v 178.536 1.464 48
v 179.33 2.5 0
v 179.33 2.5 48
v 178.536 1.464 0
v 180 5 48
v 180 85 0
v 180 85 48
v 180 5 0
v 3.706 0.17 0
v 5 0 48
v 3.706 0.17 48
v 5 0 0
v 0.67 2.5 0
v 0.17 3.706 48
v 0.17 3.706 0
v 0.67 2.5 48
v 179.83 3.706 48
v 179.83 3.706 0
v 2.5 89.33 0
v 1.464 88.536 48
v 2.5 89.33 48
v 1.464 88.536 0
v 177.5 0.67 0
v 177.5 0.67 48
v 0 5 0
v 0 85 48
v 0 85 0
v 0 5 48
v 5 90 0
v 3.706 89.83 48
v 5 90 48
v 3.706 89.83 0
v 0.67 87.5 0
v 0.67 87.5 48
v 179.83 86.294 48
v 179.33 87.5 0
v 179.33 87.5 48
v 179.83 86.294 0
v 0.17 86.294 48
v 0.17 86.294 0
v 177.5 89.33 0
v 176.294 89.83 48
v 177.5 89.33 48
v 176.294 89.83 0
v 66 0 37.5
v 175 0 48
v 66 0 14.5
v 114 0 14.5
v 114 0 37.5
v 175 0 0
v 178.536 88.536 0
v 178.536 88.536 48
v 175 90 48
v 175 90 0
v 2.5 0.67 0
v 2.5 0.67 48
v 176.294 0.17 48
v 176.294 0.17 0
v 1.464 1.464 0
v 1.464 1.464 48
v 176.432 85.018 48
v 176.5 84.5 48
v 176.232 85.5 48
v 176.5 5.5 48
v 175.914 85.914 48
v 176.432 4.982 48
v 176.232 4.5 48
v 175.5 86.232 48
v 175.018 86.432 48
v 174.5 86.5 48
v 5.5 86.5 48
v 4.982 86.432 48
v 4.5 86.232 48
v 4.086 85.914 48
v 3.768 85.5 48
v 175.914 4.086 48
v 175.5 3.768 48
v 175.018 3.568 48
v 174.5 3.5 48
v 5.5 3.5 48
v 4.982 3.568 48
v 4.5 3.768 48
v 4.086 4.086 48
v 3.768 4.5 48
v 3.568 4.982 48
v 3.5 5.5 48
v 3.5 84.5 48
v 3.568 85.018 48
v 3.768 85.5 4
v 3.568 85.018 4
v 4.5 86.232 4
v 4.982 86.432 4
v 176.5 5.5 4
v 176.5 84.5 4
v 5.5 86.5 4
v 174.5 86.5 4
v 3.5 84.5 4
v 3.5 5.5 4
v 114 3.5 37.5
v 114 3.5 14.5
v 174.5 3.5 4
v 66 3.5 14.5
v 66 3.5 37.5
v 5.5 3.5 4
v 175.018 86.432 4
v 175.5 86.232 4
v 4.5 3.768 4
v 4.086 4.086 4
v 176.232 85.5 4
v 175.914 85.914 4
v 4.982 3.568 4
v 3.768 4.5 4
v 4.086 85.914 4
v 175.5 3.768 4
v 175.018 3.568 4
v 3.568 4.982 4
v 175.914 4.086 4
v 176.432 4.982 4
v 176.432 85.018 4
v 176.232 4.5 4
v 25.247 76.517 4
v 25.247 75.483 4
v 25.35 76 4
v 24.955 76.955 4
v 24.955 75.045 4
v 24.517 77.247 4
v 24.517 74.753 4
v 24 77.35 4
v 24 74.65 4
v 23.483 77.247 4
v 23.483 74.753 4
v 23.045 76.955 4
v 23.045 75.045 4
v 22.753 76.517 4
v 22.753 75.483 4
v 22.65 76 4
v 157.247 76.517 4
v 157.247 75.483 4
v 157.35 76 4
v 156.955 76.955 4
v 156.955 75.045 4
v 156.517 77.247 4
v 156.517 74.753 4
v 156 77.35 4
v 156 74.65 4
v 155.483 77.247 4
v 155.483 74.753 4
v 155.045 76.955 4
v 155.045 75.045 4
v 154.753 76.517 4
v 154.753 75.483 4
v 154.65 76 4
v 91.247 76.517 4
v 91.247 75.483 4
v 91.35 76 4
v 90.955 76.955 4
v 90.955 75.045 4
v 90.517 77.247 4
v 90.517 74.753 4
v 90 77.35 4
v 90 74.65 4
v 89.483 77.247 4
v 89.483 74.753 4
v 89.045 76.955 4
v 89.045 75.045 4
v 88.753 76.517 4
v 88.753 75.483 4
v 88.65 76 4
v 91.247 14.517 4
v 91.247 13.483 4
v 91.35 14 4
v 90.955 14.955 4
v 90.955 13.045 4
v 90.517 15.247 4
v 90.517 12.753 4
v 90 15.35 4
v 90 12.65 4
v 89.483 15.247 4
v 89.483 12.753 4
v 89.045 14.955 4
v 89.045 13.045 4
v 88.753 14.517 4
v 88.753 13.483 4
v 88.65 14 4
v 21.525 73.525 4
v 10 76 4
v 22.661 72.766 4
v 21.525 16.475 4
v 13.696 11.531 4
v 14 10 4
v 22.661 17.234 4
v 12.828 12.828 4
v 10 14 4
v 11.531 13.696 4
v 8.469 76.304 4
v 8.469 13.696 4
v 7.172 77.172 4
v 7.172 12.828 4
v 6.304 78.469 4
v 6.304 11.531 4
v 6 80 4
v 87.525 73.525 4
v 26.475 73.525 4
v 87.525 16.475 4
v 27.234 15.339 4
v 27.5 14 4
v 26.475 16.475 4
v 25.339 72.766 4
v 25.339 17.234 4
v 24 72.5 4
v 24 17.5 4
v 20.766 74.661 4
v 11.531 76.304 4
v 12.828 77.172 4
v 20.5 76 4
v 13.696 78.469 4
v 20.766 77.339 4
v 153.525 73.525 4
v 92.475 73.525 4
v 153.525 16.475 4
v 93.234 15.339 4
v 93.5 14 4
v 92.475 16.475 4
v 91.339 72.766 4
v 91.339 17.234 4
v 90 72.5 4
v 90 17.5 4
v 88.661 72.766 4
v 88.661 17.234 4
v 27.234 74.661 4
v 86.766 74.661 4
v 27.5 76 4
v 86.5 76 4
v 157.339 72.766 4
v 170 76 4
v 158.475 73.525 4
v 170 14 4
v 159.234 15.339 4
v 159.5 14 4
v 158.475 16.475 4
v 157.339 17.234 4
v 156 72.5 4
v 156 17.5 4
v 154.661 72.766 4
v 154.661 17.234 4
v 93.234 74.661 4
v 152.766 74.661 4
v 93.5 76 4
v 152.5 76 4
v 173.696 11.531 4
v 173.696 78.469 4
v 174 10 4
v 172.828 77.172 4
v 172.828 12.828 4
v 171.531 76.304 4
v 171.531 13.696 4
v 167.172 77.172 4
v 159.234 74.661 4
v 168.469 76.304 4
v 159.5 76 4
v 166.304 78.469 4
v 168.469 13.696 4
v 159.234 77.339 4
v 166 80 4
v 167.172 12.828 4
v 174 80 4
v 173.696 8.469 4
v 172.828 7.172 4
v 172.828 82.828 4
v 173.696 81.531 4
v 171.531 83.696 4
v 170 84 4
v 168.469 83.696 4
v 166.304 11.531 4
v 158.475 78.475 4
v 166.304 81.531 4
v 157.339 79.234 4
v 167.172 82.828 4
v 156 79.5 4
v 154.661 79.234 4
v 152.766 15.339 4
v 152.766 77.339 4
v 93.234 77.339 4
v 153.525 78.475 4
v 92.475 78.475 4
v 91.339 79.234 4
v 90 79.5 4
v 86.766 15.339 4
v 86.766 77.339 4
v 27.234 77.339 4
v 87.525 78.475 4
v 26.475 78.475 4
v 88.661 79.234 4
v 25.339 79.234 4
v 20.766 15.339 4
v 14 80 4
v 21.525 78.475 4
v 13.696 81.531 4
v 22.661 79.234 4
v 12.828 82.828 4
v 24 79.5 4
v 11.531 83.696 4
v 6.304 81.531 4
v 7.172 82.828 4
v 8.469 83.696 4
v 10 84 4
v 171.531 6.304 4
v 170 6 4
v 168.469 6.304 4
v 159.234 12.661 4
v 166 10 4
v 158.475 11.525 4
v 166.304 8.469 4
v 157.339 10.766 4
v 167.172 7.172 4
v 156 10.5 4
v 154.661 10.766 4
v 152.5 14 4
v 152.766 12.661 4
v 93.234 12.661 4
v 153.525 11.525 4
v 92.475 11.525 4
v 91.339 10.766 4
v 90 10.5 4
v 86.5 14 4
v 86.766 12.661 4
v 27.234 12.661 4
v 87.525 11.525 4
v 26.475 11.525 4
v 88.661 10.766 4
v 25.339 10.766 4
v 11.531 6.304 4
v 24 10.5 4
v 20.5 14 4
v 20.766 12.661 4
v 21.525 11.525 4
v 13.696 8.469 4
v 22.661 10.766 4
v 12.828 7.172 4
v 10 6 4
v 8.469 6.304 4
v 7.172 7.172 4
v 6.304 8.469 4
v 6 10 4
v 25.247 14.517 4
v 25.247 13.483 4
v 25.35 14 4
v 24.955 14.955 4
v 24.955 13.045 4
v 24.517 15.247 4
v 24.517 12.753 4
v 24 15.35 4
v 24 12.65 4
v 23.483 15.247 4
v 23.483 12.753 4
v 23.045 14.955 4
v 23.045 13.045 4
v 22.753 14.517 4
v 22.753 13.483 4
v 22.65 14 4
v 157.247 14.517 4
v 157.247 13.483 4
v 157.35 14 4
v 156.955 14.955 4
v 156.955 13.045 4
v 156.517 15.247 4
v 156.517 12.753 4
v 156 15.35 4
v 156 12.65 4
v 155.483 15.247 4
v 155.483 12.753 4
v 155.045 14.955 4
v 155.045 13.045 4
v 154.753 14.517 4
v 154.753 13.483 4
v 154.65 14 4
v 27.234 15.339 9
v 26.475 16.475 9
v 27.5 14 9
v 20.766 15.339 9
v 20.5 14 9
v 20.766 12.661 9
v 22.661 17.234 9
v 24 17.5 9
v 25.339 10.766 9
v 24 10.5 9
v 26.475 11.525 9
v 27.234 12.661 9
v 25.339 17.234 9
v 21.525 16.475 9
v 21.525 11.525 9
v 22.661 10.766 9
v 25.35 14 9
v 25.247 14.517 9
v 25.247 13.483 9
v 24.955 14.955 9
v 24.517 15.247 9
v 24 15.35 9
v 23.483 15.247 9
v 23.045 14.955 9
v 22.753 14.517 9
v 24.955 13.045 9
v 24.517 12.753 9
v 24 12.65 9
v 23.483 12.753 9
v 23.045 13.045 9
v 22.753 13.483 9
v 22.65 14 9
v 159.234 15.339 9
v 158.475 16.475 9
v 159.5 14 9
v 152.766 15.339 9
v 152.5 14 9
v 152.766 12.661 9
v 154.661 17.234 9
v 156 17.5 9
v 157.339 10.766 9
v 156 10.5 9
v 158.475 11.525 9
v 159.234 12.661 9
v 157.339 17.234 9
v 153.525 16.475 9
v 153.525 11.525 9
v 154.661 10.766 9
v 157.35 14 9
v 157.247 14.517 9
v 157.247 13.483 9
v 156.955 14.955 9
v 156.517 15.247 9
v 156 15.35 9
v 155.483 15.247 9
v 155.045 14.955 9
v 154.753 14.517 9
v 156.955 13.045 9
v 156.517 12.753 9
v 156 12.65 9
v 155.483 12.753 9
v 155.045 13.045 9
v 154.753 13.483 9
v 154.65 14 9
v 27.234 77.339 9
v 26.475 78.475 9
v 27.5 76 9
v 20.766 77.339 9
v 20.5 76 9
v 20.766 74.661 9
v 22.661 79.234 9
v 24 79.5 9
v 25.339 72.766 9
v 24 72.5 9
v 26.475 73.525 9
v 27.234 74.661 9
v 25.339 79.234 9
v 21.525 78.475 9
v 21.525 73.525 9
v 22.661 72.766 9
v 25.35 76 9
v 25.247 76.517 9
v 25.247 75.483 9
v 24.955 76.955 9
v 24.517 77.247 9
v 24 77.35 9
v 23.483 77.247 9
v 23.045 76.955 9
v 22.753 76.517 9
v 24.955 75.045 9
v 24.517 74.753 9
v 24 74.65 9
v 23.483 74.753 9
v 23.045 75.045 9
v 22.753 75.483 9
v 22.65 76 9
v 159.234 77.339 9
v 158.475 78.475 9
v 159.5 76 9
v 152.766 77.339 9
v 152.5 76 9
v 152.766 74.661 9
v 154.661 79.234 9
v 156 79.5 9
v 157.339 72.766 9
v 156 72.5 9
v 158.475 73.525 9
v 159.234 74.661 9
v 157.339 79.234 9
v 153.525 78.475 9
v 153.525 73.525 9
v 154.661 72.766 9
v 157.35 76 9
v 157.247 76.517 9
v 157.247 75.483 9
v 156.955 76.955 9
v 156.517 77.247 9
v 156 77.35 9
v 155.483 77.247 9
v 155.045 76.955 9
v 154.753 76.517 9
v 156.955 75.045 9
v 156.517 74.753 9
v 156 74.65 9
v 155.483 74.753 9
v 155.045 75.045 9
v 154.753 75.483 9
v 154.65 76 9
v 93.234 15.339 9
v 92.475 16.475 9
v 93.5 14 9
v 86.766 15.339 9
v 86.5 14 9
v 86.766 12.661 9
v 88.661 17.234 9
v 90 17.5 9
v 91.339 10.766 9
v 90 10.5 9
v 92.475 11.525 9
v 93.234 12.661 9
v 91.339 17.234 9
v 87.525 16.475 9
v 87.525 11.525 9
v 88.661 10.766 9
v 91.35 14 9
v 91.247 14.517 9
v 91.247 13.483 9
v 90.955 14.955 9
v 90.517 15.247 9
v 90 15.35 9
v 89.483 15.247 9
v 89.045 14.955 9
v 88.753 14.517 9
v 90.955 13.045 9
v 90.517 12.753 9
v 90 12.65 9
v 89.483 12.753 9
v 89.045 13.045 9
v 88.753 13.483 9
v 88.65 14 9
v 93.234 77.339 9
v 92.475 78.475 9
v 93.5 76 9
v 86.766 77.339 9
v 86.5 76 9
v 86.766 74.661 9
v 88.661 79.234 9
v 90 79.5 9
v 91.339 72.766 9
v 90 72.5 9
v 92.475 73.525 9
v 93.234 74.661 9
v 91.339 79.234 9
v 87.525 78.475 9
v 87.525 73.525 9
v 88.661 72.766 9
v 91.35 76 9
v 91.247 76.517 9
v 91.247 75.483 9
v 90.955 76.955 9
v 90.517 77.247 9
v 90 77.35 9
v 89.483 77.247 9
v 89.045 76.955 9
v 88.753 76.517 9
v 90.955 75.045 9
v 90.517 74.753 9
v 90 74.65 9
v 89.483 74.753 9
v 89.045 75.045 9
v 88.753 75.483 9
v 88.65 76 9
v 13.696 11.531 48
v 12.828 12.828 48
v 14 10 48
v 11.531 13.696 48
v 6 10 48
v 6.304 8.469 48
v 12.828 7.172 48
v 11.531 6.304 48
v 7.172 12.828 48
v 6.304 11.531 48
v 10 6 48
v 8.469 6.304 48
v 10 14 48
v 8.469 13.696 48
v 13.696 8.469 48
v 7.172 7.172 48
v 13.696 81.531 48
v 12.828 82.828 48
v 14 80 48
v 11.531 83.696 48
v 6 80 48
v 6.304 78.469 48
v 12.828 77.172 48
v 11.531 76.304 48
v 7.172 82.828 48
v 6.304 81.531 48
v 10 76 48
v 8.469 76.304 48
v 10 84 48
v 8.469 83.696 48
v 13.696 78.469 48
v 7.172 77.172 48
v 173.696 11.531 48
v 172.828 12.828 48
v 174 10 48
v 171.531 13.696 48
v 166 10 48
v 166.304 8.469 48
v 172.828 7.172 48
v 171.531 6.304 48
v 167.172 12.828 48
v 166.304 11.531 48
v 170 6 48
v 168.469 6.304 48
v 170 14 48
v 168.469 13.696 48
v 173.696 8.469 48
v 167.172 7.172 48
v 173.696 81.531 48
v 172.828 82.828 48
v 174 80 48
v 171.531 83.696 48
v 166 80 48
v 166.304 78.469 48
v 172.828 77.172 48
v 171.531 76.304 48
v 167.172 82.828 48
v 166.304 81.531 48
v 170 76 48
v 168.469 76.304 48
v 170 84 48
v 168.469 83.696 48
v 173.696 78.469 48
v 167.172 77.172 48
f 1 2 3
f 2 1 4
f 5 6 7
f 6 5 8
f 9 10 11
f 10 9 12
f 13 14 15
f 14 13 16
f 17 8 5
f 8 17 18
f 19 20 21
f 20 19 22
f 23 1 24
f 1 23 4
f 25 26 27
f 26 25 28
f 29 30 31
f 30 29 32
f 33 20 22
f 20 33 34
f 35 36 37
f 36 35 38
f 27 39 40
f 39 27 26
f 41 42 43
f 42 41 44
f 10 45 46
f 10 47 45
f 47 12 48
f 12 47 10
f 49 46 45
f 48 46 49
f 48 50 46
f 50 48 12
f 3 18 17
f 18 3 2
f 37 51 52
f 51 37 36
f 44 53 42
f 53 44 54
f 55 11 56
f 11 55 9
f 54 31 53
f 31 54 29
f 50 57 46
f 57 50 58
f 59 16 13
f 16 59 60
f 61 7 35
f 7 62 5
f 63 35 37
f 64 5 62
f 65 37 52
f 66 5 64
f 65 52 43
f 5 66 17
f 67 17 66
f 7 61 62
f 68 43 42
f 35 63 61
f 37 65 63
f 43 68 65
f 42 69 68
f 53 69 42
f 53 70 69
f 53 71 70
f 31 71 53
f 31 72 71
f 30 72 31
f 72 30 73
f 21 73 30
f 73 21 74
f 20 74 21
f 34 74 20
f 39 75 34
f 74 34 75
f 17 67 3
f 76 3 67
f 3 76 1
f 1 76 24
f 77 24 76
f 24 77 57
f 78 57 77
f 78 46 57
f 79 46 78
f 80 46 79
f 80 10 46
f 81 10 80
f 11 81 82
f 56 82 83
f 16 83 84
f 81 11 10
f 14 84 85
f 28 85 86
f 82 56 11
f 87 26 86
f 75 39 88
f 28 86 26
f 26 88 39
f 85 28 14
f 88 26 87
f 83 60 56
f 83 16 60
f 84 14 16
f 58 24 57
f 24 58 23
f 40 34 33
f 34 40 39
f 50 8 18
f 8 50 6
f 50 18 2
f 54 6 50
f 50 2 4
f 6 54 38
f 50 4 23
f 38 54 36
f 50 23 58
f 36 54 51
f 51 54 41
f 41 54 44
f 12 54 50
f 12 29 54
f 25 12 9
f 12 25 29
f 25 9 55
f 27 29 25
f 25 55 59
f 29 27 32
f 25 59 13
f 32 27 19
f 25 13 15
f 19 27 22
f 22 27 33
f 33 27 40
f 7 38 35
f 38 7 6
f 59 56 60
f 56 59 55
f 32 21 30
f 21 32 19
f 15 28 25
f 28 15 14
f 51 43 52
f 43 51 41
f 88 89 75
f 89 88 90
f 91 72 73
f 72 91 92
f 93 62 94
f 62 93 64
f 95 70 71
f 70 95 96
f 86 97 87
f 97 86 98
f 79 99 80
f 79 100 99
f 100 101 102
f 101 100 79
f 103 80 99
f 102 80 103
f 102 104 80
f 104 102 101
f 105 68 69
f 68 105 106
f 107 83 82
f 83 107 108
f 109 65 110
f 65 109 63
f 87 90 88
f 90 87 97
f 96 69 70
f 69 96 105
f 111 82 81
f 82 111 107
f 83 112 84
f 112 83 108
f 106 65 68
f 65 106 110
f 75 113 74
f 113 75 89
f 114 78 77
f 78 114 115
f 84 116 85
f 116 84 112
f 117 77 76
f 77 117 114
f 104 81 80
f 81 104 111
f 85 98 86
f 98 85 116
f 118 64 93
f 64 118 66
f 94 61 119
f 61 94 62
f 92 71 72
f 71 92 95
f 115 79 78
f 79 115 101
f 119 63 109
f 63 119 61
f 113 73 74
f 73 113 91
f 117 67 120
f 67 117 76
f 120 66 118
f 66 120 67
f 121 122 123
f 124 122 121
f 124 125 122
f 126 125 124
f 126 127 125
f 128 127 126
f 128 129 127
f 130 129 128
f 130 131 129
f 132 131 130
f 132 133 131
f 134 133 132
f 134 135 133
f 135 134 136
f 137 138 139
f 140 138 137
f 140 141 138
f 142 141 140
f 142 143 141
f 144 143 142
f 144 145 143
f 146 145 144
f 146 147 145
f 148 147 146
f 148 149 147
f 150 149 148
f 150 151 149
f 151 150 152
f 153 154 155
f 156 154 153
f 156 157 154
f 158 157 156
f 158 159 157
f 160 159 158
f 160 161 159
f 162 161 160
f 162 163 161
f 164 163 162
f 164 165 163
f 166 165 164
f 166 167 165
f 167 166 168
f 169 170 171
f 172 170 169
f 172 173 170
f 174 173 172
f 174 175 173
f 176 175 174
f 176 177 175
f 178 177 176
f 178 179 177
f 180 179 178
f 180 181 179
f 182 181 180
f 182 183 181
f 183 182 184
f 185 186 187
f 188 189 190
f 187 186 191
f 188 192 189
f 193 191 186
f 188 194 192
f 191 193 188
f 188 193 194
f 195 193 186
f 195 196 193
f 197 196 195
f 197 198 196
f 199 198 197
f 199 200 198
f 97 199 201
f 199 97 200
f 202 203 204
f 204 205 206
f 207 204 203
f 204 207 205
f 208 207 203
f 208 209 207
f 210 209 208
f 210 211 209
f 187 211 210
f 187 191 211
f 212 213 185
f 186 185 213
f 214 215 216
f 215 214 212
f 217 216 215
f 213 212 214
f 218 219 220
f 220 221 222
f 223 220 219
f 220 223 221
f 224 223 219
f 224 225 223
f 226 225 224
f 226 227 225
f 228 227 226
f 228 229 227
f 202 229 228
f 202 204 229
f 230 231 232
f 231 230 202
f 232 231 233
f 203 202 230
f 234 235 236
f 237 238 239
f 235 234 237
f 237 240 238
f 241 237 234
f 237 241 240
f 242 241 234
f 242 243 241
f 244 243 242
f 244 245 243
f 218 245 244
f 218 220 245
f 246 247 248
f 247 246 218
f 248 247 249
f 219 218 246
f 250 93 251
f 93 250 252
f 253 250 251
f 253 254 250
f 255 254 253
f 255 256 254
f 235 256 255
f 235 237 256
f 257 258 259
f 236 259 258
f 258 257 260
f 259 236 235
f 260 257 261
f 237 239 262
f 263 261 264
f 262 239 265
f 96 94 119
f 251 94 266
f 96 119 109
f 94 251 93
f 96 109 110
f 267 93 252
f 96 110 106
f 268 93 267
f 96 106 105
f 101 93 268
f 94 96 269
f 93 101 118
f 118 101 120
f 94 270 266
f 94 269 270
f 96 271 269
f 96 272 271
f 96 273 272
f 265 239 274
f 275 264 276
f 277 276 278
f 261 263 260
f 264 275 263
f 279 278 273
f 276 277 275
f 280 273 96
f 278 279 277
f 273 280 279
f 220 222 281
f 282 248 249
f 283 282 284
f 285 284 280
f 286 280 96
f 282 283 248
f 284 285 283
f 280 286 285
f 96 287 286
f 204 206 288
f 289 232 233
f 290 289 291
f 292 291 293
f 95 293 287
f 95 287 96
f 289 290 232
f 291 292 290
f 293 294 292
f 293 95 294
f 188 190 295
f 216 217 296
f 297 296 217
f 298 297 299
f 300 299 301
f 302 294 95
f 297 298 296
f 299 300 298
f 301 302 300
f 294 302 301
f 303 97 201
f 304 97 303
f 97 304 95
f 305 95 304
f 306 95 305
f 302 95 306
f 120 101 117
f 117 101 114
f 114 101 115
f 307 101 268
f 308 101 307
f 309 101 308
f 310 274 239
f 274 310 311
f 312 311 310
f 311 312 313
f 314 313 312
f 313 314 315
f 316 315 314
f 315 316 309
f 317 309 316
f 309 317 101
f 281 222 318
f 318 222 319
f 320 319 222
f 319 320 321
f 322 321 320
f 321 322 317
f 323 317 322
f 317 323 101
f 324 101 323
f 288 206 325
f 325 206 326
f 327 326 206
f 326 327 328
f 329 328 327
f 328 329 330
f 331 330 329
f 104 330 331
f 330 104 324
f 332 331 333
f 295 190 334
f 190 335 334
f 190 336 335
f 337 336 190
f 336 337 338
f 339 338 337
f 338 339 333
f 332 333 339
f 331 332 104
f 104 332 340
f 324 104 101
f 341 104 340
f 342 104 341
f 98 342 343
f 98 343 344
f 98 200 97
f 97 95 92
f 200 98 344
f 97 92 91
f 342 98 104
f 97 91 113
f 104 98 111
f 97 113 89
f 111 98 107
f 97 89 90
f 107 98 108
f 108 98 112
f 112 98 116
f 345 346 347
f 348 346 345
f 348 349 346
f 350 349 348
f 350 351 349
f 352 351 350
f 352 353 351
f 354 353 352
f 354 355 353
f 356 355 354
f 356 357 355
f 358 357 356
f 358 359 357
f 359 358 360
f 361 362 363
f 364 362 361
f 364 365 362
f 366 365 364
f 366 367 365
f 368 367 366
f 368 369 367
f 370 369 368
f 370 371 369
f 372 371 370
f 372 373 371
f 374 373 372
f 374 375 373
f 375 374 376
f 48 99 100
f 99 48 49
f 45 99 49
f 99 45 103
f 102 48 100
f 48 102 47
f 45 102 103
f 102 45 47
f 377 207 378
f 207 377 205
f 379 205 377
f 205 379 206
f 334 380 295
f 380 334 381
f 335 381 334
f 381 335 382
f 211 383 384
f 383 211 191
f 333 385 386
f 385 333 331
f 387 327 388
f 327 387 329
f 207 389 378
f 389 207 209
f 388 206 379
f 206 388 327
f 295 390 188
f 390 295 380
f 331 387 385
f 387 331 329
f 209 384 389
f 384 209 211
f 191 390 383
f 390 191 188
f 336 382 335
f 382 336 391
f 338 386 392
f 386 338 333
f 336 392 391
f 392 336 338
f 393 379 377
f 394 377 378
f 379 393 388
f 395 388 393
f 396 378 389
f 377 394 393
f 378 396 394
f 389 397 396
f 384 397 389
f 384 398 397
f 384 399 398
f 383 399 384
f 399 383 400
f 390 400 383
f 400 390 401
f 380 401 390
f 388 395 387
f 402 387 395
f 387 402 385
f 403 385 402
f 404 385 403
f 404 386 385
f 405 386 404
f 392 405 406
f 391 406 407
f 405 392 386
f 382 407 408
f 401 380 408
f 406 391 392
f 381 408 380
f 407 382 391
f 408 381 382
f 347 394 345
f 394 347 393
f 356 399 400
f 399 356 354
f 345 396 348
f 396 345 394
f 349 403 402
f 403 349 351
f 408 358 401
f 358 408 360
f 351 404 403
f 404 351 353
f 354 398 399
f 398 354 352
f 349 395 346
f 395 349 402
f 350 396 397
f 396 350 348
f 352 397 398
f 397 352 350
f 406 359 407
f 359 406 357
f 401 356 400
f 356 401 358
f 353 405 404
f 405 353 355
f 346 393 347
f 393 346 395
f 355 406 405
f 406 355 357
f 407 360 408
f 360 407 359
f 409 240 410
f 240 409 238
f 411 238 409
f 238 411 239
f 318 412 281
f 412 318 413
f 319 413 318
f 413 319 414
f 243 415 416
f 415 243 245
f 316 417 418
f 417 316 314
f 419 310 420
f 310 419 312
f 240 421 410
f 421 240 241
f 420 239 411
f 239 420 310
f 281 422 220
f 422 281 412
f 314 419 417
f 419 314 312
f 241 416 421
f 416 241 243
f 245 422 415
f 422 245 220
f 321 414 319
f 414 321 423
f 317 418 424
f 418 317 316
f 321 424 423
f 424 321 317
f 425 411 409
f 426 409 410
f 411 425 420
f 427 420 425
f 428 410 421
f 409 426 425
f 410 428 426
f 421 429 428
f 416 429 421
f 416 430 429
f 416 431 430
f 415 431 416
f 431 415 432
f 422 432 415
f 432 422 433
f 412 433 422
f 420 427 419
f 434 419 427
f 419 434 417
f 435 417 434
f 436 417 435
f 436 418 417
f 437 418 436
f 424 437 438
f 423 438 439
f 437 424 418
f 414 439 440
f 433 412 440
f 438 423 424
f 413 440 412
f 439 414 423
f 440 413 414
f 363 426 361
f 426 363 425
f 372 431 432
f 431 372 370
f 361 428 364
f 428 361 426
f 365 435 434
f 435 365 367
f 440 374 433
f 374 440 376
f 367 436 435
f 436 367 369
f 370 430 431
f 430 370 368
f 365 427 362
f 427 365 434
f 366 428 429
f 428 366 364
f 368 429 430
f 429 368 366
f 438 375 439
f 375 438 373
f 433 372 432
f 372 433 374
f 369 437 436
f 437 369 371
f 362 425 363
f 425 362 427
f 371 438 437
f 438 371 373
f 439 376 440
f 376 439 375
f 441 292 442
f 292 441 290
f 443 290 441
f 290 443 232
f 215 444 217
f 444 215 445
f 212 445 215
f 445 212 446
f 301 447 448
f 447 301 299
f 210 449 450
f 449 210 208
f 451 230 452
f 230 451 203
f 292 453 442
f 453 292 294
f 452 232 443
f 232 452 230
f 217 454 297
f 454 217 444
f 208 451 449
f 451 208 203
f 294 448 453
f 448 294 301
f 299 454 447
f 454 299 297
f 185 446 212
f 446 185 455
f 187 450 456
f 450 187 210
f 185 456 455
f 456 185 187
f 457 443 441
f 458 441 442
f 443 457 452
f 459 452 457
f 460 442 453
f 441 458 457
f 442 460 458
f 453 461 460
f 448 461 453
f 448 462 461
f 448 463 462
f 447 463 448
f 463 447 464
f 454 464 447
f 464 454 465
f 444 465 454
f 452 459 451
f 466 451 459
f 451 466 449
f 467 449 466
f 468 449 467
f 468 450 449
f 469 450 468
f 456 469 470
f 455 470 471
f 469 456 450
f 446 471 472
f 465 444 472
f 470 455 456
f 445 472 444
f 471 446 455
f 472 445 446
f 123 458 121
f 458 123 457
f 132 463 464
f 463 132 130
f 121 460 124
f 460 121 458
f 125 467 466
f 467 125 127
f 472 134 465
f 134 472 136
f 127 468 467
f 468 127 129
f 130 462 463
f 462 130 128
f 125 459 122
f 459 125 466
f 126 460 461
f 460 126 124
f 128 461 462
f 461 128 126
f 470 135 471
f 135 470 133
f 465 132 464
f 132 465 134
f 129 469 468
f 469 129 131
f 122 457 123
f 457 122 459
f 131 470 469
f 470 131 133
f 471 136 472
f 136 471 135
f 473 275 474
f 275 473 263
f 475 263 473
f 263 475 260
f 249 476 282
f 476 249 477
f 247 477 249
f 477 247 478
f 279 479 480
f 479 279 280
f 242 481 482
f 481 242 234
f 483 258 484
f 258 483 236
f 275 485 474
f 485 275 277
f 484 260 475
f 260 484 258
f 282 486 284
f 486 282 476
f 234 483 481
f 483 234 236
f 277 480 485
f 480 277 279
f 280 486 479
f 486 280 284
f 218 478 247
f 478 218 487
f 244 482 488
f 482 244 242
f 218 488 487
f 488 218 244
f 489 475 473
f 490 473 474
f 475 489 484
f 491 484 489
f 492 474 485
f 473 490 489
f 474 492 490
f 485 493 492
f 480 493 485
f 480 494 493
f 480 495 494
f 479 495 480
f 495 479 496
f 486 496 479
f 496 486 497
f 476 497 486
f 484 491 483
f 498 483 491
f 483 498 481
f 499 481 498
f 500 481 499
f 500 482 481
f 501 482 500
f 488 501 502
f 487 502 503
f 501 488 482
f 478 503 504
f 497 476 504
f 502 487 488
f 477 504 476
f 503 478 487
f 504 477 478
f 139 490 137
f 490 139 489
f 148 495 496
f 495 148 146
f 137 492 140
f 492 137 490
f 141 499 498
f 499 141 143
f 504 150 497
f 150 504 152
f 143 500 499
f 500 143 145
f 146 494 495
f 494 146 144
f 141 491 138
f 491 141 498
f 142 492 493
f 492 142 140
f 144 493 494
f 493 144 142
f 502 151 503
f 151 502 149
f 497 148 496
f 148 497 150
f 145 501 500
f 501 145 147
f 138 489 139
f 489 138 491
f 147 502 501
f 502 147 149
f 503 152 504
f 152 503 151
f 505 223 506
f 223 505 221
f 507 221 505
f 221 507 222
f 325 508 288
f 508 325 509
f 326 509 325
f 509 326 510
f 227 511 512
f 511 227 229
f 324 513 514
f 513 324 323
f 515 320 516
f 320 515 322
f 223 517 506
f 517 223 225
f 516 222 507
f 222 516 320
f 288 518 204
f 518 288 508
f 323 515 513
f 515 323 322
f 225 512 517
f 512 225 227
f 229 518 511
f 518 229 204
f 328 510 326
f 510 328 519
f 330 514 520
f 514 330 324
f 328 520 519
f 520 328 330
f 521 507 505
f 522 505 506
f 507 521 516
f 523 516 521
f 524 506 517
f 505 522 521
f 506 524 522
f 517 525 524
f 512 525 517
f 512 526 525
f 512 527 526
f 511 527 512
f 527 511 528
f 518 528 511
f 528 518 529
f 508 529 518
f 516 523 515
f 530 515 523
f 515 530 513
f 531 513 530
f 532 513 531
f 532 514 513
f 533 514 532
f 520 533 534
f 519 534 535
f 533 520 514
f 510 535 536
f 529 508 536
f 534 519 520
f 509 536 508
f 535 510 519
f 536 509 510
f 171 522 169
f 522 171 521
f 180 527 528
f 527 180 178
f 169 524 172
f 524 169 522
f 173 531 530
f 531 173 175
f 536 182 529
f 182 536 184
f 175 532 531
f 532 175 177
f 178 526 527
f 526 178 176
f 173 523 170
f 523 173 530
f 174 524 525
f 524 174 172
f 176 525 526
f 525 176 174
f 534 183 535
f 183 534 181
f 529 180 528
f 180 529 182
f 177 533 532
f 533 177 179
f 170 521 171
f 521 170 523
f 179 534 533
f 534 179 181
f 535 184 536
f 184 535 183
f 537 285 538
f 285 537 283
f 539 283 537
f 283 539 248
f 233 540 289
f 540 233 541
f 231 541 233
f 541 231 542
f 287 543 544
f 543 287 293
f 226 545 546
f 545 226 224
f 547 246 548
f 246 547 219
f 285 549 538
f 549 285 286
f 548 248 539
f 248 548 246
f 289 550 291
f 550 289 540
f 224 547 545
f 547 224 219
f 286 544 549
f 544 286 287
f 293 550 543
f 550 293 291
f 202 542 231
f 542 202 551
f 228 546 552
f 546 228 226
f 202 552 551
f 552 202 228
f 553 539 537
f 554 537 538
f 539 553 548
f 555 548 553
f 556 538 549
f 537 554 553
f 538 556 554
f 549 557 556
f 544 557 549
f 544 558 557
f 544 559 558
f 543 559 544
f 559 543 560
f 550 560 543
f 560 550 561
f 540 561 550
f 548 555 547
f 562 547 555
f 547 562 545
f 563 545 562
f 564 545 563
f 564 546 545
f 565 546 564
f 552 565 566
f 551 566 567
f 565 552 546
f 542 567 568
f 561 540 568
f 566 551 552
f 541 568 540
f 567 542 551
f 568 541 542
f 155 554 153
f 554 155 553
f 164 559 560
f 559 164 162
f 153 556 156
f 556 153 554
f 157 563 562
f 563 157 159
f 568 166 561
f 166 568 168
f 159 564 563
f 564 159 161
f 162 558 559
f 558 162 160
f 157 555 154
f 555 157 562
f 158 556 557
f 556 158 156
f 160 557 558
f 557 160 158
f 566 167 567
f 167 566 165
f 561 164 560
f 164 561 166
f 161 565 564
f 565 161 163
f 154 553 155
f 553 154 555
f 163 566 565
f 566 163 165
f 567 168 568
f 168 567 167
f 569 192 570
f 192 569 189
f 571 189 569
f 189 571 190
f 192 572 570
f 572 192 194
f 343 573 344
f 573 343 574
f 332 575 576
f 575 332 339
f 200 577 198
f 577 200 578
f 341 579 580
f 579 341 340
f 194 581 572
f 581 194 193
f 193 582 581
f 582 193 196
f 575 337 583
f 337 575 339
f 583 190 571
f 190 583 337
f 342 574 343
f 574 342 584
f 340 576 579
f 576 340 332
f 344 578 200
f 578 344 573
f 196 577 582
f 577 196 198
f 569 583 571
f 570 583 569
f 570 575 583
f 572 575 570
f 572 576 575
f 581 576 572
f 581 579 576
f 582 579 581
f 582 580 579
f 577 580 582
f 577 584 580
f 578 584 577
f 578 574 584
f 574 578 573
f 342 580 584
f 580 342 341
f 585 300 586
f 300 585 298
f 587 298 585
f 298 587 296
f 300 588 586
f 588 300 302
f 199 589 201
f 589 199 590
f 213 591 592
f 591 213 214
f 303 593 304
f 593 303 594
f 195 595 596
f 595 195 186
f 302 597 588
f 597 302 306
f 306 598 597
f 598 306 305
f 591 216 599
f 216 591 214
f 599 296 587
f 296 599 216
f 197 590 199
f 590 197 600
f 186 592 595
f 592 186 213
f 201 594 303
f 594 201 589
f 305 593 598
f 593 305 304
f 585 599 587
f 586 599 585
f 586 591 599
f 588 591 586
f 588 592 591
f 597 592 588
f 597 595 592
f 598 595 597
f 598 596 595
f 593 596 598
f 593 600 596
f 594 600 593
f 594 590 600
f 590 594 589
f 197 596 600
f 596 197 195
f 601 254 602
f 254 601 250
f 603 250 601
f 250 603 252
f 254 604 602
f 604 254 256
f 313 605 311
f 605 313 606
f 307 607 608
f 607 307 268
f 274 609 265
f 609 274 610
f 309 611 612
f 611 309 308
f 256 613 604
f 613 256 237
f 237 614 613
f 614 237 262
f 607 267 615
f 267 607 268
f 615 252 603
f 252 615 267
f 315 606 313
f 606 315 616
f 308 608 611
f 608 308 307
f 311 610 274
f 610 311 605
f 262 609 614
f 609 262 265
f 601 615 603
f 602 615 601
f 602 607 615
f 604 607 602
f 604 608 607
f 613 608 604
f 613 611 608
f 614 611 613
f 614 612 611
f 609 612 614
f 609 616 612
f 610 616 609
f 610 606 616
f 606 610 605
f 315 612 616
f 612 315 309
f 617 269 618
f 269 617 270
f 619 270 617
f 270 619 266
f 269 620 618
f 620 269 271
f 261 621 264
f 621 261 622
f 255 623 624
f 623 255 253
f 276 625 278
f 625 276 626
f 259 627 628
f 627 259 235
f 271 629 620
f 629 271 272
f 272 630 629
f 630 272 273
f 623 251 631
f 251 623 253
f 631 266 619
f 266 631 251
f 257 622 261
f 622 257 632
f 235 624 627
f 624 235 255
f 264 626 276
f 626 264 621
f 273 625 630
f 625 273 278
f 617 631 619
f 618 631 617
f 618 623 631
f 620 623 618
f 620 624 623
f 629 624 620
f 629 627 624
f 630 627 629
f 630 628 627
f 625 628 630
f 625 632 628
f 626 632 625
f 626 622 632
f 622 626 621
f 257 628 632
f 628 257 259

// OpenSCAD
/**
 * mains_filter_box.scad — TM-RFI-ENC-001 Rev A
 * AC Mains EMI Line Filter Enclosure
 *
 * SAFETY: This enclosure operates at mains voltage.
 * Print in PETG (heat-resistant, chemical-resistant).
 * Use heavy-walled construction (3mm minimum).
 * All internal surfaces accept copper tape for shielding.
 * Mount on grounded metal surface or install in metal outer box.
 *
 * Features:
 *   - 130×80×55 mm body (fits PCB 120×70 mm)
 *   - IEC C14 inlet cutout (mains input)
 *   - 4× IEC C13 outlet holes (shack equipment)
 *   - Ground terminal hole (chassis earth)
 *   - PCB standoffs for filter PCB
 *   - Solid walls (no vents — mains voltage inside)
 *   - Snap-fit lid + M3 security screws
 *   - Mains voltage warning label recess on top
 */

// ── Parameters ─────────────────────────────────────────────────────────────
box_w   = 180.0;   // X — enough for 4× C13 outlets
box_d   = 90.0;    // Y
box_h   = 60.0;    // Z total
wall    = 3.5;     // heavy wall (mains safety)
floor_h = 4.0;     // thick floor
lid_h   = 12.0;
body_h  = box_h - lid_h;
r = 5.0;
$fn = 32;

// IEC C14 inlet: 48×23 mm opening
iec_w  = 48.0;
iec_h  = 23.0;

// IEC C13 outlet: 25×17 mm opening
c13_w  = 25.0;
c13_h  = 17.0;

// Ground terminal: 6.5mm hole (M6 bolt)
gnd_d  = 6.5;

// PCB dims
pcb_w  = 140.0;
pcb_d  = 70.0;
pcb_so_h = 5.0;
pcb_so_od = 7.0;
pcb_so_id = 2.7;

// Label recess
label_w = 60.0;
label_h = 15.0;
label_depth = 0.8;

// Lid screws
screw_d = 3.3;

module rounded_box(w, d, h, r_) {
    hull()
        for (x=[r_, w-r_]) for (y=[r_, d-r_])
            translate([x, y, 0]) cylinder(h=h, r=r_, $fn=24);
}

module standoff(x, y) {
    translate([x, y, floor_h])
        difference() {
            cylinder(h=pcb_so_h, d=pcb_so_od, $fn=16);
            translate([0,0,-0.5]) cylinder(h=pcb_so_h+1, d=pcb_so_id, $fn=16);
        }
}

module body() {
    difference() {
        rounded_box(box_w, box_d, body_h, r);

        // Inner cavity
        translate([wall, wall, floor_h])
            rounded_box(box_w-2*wall, box_d-2*wall, body_h, r-wall+0.5);

        // ── REAR PANEL (y=0): IEC C14 mains inlet ─────────────────────
        // Centered, at mid-height
        translate([(box_w - iec_w)/2, -0.5, floor_h + (body_h - floor_h - iec_h)/2])
            cube([iec_w, wall+1, iec_h]);

        // ── FRONT PANEL (y=box_d): 4× IEC C13 outlets ─────────────────
        for (i=[0:3])
            translate([12 + i*(c13_w + 8), box_d+0.5,
                       floor_h + (body_h - floor_h - c13_h)/2])
                cube([c13_w, wall+1, c13_h]);

        // ── RIGHT SIDE: Ground terminal ────────────────────────────────
        translate([box_w+0.5, box_d/2, floor_h + 10])
        rotate([0, 90, 0])
            cylinder(h=wall+1, d=gnd_d, $fn=16);

        // ── Lid screw holes ─────────────────────────────────────────────
        for (x=[10, box_w-10]) for (y=[10, box_d-10])
            translate([x, y, body_h-6])
                cylinder(h=7, d=screw_d, $fn=16);
    }

    // PCB standoffs
    ox = (box_w - pcb_w) / 2;
    oy = (box_d - pcb_d) / 2;
    standoff(ox + 4,       oy + 4);
    standoff(ox + pcb_w-4, oy + 4);
    standoff(ox + 4,       oy + pcb_d-4);
    standoff(ox + pcb_w-4, oy + pcb_d-4);
    standoff(ox + pcb_w/2, oy + 4);      // center support
    standoff(ox + pcb_w/2, oy + pcb_d-4);

    // Corner screw bosses
    for (x=[10, box_w-10]) for (y=[10, box_d-10])
        translate([x, y, 0]) cylinder(h=body_h, d=8, $fn=16);
}

module lid() {
    fl_d = 4.0;
    plate_h = lid_h - fl_d;
    difference() {
        union() {
            rounded_box(box_w, box_d, plate_h, r);
            translate([wall+1, wall+1, plate_h])
                rounded_box(box_w-2*(wall+1), box_d-2*(wall+1), fl_d, r-wall);
        }
        // Screws
        for (x=[10, box_w-10]) for (y=[10, box_d-10])
            translate([x, y, -0.5])
                cylinder(h=lid_h+1, d=screw_d, $fn=16);
        // Warning label recess (embossed area)
        translate([(box_w - label_w)/2, (box_d - label_h)/2, -0.5])
            cube([label_w, label_h, label_depth + 0.5]);
    }
    // Text raised inside label recess — print with filament change at layer:
    // "MAINS VOLTAGE - HAZARDOUS"
    translate([(box_w - label_w)/2 + 4, (box_d - label_h)/2 + 3, plate_h - label_depth])
        linear_extrude(label_depth + 0.5)
            text("MAINS VOLTAGE", size=3.5, font="Liberation Sans:style=Bold");
}

// ── Assembly Notes ──────────────────────────────────────────────────────────
// 1. Print body and lid in PETG at 40% infill minimum.
// 2. Line ALL interior surfaces with copper tape (walls, floor, lid interior).
// 3. SAFETY: Install PCB in box. Wire IEC C14 → filter → C13 outlets.
//    All mains connections with properly rated wire and ferrules.
// 4. Earth ground: M6 bolt through ground terminal hole connects to safety earth.
//    Also connect safety earth to copper tape lining via ring terminal.
// 5. Lock lid with M3 screws. Apply "MAINS VOLTAGE" warning sticker.
// 6. Mount finished box on power strip or bench surface.
//    DO NOT OPEN WHILE ENERGIZED.

print_part = "body";  // "body" | "lid"

if (print_part == "body") {
    color("ivory", 0.9) body();
} else {
    color("beige", 0.9) lid();
}
